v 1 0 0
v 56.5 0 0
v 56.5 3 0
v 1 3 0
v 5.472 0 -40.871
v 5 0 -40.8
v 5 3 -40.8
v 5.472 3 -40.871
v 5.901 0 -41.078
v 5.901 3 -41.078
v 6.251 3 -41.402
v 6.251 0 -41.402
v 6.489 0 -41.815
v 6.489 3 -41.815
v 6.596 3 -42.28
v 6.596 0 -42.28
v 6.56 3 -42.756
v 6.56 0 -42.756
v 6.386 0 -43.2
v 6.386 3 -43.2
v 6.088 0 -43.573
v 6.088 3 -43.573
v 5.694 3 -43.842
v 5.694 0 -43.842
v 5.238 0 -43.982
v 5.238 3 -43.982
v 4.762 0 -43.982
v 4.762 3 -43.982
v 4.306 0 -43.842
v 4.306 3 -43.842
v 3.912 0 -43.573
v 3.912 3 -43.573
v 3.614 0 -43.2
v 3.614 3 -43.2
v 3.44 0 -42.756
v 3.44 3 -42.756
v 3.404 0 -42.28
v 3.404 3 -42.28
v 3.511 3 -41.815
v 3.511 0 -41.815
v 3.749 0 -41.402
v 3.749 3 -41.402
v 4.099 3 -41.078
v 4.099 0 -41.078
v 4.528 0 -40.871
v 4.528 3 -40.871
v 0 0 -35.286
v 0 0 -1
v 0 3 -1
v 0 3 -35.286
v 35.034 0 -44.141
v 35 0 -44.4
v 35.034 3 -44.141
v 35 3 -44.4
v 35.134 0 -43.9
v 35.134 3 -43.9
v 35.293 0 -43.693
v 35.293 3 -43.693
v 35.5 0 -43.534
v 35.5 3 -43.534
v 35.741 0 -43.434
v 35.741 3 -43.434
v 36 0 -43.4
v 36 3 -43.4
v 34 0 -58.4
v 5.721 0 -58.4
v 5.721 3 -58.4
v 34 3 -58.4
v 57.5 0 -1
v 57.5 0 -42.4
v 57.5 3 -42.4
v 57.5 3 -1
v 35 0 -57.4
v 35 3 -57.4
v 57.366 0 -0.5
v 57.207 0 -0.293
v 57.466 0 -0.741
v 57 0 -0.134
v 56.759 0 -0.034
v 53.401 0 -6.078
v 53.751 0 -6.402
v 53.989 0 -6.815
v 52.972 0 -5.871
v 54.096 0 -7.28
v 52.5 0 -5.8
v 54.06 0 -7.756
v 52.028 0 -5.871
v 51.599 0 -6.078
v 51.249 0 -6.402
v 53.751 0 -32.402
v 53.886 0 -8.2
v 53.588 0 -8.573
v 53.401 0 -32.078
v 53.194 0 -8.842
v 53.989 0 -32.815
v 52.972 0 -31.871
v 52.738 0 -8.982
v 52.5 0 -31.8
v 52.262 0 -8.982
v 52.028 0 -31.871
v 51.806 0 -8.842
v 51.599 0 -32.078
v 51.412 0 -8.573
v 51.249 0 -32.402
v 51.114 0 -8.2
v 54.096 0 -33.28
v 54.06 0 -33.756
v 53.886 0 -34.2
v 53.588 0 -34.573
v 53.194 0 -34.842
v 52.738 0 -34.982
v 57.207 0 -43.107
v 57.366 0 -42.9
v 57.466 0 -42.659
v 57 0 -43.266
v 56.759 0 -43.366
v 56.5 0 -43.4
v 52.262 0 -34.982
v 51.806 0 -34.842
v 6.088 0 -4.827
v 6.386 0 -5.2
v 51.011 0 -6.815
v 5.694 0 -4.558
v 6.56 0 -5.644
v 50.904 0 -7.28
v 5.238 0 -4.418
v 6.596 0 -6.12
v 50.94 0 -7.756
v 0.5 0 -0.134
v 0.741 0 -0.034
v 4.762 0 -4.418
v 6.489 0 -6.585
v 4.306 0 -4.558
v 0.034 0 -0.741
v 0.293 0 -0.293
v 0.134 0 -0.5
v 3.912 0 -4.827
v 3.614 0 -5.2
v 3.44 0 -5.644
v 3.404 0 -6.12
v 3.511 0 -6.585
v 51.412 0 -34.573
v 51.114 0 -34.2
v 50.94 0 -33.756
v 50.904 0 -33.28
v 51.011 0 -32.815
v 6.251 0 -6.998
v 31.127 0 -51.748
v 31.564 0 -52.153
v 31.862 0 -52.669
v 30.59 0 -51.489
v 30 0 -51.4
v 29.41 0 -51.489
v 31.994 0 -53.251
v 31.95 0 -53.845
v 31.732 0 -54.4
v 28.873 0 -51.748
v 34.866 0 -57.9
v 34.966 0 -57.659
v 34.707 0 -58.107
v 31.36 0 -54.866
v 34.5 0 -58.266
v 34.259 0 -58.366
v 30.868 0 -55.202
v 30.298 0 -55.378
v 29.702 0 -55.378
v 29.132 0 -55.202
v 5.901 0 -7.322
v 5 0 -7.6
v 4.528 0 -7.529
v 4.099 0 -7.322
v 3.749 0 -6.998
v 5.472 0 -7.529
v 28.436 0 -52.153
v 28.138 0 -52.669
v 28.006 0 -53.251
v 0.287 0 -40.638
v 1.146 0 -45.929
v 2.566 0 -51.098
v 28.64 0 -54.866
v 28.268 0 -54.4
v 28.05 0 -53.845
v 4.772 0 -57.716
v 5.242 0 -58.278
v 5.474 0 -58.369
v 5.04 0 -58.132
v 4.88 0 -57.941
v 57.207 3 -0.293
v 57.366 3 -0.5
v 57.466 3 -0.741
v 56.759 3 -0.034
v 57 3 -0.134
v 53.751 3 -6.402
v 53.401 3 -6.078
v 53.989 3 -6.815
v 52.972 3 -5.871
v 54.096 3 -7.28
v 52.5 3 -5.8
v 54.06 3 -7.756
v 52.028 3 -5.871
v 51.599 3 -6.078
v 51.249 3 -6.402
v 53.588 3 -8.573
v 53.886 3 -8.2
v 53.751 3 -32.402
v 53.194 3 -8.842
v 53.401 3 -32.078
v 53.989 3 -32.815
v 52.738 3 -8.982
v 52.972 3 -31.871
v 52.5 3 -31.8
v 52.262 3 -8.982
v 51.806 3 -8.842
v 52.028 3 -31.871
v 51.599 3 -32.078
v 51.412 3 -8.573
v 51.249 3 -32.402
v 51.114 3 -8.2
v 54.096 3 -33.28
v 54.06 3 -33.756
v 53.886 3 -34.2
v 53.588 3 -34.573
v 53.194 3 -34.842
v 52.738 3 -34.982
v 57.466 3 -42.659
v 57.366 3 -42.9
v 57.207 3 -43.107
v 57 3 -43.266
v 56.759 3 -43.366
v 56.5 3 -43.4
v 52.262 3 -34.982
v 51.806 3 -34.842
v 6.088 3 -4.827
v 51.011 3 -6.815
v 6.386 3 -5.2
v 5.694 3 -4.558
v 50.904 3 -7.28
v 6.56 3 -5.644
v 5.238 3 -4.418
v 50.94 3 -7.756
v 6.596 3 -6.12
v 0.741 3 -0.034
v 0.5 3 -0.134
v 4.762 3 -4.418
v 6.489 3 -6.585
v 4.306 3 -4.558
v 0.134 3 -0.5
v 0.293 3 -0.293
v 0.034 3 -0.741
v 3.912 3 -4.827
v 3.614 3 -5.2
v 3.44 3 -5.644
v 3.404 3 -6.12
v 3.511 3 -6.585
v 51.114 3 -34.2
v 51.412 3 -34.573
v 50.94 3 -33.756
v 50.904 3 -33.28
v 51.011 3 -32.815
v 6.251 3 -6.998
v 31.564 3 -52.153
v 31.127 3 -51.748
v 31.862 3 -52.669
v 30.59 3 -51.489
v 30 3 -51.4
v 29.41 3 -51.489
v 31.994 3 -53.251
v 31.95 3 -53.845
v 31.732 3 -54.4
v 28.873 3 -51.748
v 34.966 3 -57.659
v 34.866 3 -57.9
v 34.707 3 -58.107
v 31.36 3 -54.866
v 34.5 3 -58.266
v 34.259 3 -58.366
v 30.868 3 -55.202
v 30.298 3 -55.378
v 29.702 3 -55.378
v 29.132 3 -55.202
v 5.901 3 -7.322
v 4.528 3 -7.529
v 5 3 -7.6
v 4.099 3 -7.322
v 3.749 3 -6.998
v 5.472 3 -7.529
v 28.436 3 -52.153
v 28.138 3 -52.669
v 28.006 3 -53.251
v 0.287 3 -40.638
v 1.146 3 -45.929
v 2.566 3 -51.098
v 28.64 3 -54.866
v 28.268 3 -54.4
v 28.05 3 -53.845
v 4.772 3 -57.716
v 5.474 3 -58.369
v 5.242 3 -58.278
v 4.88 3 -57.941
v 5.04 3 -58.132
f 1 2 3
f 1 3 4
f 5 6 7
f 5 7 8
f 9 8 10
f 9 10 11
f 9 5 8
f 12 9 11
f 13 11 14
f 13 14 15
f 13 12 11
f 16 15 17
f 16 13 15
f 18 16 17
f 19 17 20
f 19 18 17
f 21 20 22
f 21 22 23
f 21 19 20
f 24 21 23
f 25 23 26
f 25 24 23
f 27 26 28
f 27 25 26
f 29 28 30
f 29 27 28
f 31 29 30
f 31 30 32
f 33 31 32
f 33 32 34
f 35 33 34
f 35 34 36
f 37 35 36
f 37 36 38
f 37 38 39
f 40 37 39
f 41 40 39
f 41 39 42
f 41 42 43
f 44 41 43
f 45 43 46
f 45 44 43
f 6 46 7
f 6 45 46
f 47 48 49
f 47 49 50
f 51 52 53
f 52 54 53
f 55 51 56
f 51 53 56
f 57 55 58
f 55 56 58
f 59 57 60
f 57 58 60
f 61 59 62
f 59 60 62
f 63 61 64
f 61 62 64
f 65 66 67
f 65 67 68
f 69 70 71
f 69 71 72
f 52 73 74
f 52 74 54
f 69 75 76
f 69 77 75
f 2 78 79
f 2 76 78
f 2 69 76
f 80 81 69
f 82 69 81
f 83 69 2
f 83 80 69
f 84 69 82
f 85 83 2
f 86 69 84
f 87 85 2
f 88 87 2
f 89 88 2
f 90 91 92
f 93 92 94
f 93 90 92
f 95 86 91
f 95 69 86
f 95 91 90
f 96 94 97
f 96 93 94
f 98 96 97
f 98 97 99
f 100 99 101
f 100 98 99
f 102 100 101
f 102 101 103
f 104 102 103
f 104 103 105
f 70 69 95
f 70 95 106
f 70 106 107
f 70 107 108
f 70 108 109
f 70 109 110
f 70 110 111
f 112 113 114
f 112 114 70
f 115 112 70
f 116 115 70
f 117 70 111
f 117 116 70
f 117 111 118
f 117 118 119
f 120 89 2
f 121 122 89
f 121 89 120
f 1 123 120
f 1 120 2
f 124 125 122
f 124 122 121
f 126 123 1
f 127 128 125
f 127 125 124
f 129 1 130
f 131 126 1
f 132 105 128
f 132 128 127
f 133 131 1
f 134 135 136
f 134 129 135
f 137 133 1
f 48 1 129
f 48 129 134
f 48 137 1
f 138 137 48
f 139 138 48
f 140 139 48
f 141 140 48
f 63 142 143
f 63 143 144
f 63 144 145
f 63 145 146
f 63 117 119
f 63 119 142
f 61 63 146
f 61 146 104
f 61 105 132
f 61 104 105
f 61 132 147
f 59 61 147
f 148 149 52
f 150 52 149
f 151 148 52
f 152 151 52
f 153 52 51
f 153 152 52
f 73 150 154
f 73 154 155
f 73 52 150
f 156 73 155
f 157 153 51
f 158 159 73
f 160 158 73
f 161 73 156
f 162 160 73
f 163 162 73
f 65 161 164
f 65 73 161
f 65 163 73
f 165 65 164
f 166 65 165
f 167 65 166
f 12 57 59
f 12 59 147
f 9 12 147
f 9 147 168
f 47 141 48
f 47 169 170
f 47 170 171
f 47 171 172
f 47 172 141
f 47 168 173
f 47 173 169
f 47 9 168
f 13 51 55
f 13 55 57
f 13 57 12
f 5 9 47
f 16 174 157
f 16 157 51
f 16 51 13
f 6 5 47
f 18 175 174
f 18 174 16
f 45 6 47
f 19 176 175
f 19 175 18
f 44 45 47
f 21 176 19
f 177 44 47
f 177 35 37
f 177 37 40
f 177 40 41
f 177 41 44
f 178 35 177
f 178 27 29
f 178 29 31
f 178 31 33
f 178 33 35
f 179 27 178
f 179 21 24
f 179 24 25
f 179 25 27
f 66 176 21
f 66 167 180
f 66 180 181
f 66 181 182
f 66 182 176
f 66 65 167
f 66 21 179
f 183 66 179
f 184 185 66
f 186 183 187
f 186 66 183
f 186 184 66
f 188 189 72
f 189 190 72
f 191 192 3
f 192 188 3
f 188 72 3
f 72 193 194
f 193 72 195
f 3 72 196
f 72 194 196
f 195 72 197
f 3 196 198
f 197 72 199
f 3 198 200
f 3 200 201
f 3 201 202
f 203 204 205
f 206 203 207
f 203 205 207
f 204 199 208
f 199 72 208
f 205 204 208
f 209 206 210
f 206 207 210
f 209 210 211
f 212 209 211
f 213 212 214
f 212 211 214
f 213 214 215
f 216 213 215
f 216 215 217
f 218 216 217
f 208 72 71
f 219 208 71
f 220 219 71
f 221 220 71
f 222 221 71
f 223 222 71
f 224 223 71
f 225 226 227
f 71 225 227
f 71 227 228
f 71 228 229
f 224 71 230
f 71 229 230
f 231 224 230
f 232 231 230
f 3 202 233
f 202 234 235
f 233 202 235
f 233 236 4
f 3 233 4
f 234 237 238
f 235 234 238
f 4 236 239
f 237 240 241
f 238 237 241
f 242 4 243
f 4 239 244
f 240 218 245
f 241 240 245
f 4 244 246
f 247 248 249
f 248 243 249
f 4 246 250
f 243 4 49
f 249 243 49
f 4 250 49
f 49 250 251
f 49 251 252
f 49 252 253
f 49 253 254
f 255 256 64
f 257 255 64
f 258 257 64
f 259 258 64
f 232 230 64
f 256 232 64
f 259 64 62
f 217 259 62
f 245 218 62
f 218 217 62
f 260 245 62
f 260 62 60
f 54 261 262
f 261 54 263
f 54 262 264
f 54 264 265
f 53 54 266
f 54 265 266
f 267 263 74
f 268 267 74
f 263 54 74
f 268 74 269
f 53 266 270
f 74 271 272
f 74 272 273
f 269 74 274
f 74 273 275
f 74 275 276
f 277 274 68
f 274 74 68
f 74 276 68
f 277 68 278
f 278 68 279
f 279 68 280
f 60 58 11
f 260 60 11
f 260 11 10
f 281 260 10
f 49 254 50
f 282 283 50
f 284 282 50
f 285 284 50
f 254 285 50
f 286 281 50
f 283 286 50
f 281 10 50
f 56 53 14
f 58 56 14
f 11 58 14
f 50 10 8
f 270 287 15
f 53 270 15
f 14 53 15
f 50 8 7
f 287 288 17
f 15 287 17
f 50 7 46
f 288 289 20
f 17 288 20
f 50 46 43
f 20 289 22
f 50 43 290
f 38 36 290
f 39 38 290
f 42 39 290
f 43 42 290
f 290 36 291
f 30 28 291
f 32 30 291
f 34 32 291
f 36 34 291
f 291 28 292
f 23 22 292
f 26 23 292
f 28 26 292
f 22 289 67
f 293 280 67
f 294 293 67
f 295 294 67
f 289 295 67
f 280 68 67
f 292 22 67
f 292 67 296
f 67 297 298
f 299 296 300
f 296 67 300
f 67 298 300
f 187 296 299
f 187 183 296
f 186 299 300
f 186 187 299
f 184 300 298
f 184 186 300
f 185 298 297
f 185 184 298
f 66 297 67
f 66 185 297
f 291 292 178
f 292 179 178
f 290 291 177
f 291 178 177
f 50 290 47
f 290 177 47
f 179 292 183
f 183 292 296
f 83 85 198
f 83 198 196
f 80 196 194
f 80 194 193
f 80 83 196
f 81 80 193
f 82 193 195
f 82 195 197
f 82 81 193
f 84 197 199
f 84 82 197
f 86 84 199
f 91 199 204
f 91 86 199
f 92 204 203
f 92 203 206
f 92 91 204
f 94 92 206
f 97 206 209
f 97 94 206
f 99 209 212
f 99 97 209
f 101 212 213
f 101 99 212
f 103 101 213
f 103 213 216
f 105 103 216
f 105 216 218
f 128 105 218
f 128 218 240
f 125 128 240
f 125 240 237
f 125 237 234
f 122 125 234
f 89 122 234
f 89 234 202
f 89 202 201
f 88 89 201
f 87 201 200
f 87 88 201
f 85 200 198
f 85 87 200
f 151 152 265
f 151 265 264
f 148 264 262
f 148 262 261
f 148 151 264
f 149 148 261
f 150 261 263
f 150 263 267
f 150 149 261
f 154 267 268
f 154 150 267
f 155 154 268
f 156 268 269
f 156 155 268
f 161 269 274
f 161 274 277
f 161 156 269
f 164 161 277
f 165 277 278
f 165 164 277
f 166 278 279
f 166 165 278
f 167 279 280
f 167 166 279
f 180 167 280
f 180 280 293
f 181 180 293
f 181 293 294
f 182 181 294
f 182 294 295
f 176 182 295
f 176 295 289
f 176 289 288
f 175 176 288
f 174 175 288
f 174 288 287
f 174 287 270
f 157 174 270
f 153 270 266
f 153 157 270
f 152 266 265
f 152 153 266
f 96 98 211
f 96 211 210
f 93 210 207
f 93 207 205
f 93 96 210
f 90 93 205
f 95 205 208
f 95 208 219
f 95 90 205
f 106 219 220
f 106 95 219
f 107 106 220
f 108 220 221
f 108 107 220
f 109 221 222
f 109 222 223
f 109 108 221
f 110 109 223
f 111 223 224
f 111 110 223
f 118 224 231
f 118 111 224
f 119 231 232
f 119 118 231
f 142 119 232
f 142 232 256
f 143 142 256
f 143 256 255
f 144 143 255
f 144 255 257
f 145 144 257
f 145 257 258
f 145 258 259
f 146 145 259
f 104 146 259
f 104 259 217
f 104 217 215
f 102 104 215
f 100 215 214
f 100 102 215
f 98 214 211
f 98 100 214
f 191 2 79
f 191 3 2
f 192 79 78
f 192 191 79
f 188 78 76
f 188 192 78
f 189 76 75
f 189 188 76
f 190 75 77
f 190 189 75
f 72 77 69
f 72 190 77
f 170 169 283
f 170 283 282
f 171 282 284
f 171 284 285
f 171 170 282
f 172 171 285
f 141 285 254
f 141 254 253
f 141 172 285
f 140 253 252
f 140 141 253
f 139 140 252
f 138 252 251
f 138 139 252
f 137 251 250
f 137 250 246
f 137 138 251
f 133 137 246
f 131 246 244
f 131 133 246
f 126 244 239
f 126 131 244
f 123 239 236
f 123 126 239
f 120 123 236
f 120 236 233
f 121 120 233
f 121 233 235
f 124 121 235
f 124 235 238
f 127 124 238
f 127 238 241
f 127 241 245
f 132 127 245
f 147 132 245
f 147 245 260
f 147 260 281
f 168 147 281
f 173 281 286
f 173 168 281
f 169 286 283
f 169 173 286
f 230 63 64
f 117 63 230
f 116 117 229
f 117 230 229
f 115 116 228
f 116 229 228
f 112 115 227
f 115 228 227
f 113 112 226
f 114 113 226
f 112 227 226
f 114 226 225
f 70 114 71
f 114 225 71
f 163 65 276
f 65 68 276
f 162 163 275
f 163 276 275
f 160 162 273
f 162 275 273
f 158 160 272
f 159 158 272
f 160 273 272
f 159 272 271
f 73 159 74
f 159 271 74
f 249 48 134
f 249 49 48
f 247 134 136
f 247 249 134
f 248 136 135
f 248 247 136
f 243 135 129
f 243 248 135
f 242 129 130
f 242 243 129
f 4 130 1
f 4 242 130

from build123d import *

# Parameters (mm, degrees)
SKETCH_1_R          = 1.6
SKETCH_1_R_2        = 2
EXTRUDE_1_DEPTH     = 3
CUT_EXTRUDE_1_DEPTH = 3
FILLET_1_R          = 50
FILLET_2_R          = 1


with BuildPart() as part:
    # ｽｹｯﾁ1 → ﾎﾞｽ - 押し出し1 (new body)
    with BuildSketch(Plane(origin=(0, 0, 0), x_dir=(1, 0, 0), z_dir=(0, 1, 0))):
        Polygon((0, 58.4), (35, 58.4), (35, 43.4), (57.5, 43.4), (57.5, 0), (0, 0), align=None)
        with Locations(Location((52.5, 7.4, 0), (0, 0, 270))):
            Circle(SKETCH_1_R, mode=Mode.SUBTRACT)
        with Locations(Location((52.5, 33.4, 0), (0, 0, 270))):
            Circle(SKETCH_1_R, mode=Mode.SUBTRACT)
        with Locations(Location((30, 53.4, 0), (0, 0, 270))):
            Circle(SKETCH_1_R_2, mode=Mode.SUBTRACT)
        with Locations(Location((5, 42.4, 0), (0, 0, 270))):
            Circle(SKETCH_1_R, mode=Mode.SUBTRACT)
        with Locations(Location((5, 6, 0), (0, 0, 90))):
            Circle(SKETCH_1_R, mode=Mode.SUBTRACT)
    extrude(amount=EXTRUDE_1_DEPTH)

    # ｽｹｯﾁ2 → ｶｯﾄ - 押し出し1 (cut)
    with BuildSketch(Plane(origin=(0, 3, 0), x_dir=(1, 0, 0), z_dir=(0, 1, 0))):
        Polygon((5, 58.4), (0, 58.4), (0, 43.4), align=None)
    extrude(amount=-CUT_EXTRUDE_1_DEPTH, mode=Mode.SUBTRACT)

    # ﾌｨﾚｯﾄ1
    fillet_1_edges = [part.edges().sort_by_distance(p)[0] for p in [
        (0, 1.5, -43.4),
    ]]
    fillet(fillet_1_edges, radius=FILLET_1_R)

    # ﾌｨﾚｯﾄ2
    fillet_2_edges = [part.edges().sort_by_distance(p)[0] for p in [
        (35, 1.5, -58.4),
        (35, 1.5, -43.4),
        (57.5, 1.5, -43.4),
        (57.5, 1.5, 0),
        (0, 1.5, 0),
        (5, 1.5, -58.4),
    ]]
    fillet(fillet_2_edges, radius=FILLET_2_R)


solid = part.part
